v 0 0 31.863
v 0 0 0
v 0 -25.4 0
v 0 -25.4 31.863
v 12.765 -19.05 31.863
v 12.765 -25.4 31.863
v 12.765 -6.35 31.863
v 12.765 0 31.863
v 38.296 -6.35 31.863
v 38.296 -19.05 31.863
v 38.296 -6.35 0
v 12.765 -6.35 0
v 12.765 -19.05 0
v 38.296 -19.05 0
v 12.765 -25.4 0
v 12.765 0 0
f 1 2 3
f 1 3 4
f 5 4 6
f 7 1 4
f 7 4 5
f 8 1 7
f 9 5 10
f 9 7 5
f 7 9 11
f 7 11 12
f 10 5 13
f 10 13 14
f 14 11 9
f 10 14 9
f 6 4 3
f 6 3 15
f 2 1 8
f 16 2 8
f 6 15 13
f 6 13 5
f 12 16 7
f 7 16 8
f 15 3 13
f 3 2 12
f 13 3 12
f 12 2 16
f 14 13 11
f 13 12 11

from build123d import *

# Parameters (mm, degrees)
F0_W     = 38.296241
F0_H     = 31.86328
F1_DEPTH = 25.4
F2_W     = 25.530826
F2_H     = 31.86328
F3_DEPTH = 6.35
F4_W     = 25.530827
F4_H     = 31.86328
F5_DEPTH = 6.35


with BuildPart() as f1:
    # F0 (on Front) → F1 (new body)
    with BuildSketch(Plane.XZ):
        with Locations((19.14812, 15.93164)):
            Rectangle(F0_W, F0_H)
    extrude(amount=F1_DEPTH)

    # F2 (on face) → F3 (cut)
    with BuildSketch(Plane.XZ.offset(25.4)):
        with Locations((25.530828, 15.93164)):
            Rectangle(F2_W, F2_H)
    extrude(amount=-F3_DEPTH, mode=Mode.SUBTRACT)

    # F4 (on face) → F5 (cut)
    with BuildSketch(Plane(origin=(0, 0, 0), x_dir=(-1, 0, 0), z_dir=(0, 1, 0))):
        with Locations((-25.530827, 15.93164)):
            Rectangle(F4_W, F4_H)
    extrude(amount=-F5_DEPTH, mode=Mode.SUBTRACT)


solid = f1.part
